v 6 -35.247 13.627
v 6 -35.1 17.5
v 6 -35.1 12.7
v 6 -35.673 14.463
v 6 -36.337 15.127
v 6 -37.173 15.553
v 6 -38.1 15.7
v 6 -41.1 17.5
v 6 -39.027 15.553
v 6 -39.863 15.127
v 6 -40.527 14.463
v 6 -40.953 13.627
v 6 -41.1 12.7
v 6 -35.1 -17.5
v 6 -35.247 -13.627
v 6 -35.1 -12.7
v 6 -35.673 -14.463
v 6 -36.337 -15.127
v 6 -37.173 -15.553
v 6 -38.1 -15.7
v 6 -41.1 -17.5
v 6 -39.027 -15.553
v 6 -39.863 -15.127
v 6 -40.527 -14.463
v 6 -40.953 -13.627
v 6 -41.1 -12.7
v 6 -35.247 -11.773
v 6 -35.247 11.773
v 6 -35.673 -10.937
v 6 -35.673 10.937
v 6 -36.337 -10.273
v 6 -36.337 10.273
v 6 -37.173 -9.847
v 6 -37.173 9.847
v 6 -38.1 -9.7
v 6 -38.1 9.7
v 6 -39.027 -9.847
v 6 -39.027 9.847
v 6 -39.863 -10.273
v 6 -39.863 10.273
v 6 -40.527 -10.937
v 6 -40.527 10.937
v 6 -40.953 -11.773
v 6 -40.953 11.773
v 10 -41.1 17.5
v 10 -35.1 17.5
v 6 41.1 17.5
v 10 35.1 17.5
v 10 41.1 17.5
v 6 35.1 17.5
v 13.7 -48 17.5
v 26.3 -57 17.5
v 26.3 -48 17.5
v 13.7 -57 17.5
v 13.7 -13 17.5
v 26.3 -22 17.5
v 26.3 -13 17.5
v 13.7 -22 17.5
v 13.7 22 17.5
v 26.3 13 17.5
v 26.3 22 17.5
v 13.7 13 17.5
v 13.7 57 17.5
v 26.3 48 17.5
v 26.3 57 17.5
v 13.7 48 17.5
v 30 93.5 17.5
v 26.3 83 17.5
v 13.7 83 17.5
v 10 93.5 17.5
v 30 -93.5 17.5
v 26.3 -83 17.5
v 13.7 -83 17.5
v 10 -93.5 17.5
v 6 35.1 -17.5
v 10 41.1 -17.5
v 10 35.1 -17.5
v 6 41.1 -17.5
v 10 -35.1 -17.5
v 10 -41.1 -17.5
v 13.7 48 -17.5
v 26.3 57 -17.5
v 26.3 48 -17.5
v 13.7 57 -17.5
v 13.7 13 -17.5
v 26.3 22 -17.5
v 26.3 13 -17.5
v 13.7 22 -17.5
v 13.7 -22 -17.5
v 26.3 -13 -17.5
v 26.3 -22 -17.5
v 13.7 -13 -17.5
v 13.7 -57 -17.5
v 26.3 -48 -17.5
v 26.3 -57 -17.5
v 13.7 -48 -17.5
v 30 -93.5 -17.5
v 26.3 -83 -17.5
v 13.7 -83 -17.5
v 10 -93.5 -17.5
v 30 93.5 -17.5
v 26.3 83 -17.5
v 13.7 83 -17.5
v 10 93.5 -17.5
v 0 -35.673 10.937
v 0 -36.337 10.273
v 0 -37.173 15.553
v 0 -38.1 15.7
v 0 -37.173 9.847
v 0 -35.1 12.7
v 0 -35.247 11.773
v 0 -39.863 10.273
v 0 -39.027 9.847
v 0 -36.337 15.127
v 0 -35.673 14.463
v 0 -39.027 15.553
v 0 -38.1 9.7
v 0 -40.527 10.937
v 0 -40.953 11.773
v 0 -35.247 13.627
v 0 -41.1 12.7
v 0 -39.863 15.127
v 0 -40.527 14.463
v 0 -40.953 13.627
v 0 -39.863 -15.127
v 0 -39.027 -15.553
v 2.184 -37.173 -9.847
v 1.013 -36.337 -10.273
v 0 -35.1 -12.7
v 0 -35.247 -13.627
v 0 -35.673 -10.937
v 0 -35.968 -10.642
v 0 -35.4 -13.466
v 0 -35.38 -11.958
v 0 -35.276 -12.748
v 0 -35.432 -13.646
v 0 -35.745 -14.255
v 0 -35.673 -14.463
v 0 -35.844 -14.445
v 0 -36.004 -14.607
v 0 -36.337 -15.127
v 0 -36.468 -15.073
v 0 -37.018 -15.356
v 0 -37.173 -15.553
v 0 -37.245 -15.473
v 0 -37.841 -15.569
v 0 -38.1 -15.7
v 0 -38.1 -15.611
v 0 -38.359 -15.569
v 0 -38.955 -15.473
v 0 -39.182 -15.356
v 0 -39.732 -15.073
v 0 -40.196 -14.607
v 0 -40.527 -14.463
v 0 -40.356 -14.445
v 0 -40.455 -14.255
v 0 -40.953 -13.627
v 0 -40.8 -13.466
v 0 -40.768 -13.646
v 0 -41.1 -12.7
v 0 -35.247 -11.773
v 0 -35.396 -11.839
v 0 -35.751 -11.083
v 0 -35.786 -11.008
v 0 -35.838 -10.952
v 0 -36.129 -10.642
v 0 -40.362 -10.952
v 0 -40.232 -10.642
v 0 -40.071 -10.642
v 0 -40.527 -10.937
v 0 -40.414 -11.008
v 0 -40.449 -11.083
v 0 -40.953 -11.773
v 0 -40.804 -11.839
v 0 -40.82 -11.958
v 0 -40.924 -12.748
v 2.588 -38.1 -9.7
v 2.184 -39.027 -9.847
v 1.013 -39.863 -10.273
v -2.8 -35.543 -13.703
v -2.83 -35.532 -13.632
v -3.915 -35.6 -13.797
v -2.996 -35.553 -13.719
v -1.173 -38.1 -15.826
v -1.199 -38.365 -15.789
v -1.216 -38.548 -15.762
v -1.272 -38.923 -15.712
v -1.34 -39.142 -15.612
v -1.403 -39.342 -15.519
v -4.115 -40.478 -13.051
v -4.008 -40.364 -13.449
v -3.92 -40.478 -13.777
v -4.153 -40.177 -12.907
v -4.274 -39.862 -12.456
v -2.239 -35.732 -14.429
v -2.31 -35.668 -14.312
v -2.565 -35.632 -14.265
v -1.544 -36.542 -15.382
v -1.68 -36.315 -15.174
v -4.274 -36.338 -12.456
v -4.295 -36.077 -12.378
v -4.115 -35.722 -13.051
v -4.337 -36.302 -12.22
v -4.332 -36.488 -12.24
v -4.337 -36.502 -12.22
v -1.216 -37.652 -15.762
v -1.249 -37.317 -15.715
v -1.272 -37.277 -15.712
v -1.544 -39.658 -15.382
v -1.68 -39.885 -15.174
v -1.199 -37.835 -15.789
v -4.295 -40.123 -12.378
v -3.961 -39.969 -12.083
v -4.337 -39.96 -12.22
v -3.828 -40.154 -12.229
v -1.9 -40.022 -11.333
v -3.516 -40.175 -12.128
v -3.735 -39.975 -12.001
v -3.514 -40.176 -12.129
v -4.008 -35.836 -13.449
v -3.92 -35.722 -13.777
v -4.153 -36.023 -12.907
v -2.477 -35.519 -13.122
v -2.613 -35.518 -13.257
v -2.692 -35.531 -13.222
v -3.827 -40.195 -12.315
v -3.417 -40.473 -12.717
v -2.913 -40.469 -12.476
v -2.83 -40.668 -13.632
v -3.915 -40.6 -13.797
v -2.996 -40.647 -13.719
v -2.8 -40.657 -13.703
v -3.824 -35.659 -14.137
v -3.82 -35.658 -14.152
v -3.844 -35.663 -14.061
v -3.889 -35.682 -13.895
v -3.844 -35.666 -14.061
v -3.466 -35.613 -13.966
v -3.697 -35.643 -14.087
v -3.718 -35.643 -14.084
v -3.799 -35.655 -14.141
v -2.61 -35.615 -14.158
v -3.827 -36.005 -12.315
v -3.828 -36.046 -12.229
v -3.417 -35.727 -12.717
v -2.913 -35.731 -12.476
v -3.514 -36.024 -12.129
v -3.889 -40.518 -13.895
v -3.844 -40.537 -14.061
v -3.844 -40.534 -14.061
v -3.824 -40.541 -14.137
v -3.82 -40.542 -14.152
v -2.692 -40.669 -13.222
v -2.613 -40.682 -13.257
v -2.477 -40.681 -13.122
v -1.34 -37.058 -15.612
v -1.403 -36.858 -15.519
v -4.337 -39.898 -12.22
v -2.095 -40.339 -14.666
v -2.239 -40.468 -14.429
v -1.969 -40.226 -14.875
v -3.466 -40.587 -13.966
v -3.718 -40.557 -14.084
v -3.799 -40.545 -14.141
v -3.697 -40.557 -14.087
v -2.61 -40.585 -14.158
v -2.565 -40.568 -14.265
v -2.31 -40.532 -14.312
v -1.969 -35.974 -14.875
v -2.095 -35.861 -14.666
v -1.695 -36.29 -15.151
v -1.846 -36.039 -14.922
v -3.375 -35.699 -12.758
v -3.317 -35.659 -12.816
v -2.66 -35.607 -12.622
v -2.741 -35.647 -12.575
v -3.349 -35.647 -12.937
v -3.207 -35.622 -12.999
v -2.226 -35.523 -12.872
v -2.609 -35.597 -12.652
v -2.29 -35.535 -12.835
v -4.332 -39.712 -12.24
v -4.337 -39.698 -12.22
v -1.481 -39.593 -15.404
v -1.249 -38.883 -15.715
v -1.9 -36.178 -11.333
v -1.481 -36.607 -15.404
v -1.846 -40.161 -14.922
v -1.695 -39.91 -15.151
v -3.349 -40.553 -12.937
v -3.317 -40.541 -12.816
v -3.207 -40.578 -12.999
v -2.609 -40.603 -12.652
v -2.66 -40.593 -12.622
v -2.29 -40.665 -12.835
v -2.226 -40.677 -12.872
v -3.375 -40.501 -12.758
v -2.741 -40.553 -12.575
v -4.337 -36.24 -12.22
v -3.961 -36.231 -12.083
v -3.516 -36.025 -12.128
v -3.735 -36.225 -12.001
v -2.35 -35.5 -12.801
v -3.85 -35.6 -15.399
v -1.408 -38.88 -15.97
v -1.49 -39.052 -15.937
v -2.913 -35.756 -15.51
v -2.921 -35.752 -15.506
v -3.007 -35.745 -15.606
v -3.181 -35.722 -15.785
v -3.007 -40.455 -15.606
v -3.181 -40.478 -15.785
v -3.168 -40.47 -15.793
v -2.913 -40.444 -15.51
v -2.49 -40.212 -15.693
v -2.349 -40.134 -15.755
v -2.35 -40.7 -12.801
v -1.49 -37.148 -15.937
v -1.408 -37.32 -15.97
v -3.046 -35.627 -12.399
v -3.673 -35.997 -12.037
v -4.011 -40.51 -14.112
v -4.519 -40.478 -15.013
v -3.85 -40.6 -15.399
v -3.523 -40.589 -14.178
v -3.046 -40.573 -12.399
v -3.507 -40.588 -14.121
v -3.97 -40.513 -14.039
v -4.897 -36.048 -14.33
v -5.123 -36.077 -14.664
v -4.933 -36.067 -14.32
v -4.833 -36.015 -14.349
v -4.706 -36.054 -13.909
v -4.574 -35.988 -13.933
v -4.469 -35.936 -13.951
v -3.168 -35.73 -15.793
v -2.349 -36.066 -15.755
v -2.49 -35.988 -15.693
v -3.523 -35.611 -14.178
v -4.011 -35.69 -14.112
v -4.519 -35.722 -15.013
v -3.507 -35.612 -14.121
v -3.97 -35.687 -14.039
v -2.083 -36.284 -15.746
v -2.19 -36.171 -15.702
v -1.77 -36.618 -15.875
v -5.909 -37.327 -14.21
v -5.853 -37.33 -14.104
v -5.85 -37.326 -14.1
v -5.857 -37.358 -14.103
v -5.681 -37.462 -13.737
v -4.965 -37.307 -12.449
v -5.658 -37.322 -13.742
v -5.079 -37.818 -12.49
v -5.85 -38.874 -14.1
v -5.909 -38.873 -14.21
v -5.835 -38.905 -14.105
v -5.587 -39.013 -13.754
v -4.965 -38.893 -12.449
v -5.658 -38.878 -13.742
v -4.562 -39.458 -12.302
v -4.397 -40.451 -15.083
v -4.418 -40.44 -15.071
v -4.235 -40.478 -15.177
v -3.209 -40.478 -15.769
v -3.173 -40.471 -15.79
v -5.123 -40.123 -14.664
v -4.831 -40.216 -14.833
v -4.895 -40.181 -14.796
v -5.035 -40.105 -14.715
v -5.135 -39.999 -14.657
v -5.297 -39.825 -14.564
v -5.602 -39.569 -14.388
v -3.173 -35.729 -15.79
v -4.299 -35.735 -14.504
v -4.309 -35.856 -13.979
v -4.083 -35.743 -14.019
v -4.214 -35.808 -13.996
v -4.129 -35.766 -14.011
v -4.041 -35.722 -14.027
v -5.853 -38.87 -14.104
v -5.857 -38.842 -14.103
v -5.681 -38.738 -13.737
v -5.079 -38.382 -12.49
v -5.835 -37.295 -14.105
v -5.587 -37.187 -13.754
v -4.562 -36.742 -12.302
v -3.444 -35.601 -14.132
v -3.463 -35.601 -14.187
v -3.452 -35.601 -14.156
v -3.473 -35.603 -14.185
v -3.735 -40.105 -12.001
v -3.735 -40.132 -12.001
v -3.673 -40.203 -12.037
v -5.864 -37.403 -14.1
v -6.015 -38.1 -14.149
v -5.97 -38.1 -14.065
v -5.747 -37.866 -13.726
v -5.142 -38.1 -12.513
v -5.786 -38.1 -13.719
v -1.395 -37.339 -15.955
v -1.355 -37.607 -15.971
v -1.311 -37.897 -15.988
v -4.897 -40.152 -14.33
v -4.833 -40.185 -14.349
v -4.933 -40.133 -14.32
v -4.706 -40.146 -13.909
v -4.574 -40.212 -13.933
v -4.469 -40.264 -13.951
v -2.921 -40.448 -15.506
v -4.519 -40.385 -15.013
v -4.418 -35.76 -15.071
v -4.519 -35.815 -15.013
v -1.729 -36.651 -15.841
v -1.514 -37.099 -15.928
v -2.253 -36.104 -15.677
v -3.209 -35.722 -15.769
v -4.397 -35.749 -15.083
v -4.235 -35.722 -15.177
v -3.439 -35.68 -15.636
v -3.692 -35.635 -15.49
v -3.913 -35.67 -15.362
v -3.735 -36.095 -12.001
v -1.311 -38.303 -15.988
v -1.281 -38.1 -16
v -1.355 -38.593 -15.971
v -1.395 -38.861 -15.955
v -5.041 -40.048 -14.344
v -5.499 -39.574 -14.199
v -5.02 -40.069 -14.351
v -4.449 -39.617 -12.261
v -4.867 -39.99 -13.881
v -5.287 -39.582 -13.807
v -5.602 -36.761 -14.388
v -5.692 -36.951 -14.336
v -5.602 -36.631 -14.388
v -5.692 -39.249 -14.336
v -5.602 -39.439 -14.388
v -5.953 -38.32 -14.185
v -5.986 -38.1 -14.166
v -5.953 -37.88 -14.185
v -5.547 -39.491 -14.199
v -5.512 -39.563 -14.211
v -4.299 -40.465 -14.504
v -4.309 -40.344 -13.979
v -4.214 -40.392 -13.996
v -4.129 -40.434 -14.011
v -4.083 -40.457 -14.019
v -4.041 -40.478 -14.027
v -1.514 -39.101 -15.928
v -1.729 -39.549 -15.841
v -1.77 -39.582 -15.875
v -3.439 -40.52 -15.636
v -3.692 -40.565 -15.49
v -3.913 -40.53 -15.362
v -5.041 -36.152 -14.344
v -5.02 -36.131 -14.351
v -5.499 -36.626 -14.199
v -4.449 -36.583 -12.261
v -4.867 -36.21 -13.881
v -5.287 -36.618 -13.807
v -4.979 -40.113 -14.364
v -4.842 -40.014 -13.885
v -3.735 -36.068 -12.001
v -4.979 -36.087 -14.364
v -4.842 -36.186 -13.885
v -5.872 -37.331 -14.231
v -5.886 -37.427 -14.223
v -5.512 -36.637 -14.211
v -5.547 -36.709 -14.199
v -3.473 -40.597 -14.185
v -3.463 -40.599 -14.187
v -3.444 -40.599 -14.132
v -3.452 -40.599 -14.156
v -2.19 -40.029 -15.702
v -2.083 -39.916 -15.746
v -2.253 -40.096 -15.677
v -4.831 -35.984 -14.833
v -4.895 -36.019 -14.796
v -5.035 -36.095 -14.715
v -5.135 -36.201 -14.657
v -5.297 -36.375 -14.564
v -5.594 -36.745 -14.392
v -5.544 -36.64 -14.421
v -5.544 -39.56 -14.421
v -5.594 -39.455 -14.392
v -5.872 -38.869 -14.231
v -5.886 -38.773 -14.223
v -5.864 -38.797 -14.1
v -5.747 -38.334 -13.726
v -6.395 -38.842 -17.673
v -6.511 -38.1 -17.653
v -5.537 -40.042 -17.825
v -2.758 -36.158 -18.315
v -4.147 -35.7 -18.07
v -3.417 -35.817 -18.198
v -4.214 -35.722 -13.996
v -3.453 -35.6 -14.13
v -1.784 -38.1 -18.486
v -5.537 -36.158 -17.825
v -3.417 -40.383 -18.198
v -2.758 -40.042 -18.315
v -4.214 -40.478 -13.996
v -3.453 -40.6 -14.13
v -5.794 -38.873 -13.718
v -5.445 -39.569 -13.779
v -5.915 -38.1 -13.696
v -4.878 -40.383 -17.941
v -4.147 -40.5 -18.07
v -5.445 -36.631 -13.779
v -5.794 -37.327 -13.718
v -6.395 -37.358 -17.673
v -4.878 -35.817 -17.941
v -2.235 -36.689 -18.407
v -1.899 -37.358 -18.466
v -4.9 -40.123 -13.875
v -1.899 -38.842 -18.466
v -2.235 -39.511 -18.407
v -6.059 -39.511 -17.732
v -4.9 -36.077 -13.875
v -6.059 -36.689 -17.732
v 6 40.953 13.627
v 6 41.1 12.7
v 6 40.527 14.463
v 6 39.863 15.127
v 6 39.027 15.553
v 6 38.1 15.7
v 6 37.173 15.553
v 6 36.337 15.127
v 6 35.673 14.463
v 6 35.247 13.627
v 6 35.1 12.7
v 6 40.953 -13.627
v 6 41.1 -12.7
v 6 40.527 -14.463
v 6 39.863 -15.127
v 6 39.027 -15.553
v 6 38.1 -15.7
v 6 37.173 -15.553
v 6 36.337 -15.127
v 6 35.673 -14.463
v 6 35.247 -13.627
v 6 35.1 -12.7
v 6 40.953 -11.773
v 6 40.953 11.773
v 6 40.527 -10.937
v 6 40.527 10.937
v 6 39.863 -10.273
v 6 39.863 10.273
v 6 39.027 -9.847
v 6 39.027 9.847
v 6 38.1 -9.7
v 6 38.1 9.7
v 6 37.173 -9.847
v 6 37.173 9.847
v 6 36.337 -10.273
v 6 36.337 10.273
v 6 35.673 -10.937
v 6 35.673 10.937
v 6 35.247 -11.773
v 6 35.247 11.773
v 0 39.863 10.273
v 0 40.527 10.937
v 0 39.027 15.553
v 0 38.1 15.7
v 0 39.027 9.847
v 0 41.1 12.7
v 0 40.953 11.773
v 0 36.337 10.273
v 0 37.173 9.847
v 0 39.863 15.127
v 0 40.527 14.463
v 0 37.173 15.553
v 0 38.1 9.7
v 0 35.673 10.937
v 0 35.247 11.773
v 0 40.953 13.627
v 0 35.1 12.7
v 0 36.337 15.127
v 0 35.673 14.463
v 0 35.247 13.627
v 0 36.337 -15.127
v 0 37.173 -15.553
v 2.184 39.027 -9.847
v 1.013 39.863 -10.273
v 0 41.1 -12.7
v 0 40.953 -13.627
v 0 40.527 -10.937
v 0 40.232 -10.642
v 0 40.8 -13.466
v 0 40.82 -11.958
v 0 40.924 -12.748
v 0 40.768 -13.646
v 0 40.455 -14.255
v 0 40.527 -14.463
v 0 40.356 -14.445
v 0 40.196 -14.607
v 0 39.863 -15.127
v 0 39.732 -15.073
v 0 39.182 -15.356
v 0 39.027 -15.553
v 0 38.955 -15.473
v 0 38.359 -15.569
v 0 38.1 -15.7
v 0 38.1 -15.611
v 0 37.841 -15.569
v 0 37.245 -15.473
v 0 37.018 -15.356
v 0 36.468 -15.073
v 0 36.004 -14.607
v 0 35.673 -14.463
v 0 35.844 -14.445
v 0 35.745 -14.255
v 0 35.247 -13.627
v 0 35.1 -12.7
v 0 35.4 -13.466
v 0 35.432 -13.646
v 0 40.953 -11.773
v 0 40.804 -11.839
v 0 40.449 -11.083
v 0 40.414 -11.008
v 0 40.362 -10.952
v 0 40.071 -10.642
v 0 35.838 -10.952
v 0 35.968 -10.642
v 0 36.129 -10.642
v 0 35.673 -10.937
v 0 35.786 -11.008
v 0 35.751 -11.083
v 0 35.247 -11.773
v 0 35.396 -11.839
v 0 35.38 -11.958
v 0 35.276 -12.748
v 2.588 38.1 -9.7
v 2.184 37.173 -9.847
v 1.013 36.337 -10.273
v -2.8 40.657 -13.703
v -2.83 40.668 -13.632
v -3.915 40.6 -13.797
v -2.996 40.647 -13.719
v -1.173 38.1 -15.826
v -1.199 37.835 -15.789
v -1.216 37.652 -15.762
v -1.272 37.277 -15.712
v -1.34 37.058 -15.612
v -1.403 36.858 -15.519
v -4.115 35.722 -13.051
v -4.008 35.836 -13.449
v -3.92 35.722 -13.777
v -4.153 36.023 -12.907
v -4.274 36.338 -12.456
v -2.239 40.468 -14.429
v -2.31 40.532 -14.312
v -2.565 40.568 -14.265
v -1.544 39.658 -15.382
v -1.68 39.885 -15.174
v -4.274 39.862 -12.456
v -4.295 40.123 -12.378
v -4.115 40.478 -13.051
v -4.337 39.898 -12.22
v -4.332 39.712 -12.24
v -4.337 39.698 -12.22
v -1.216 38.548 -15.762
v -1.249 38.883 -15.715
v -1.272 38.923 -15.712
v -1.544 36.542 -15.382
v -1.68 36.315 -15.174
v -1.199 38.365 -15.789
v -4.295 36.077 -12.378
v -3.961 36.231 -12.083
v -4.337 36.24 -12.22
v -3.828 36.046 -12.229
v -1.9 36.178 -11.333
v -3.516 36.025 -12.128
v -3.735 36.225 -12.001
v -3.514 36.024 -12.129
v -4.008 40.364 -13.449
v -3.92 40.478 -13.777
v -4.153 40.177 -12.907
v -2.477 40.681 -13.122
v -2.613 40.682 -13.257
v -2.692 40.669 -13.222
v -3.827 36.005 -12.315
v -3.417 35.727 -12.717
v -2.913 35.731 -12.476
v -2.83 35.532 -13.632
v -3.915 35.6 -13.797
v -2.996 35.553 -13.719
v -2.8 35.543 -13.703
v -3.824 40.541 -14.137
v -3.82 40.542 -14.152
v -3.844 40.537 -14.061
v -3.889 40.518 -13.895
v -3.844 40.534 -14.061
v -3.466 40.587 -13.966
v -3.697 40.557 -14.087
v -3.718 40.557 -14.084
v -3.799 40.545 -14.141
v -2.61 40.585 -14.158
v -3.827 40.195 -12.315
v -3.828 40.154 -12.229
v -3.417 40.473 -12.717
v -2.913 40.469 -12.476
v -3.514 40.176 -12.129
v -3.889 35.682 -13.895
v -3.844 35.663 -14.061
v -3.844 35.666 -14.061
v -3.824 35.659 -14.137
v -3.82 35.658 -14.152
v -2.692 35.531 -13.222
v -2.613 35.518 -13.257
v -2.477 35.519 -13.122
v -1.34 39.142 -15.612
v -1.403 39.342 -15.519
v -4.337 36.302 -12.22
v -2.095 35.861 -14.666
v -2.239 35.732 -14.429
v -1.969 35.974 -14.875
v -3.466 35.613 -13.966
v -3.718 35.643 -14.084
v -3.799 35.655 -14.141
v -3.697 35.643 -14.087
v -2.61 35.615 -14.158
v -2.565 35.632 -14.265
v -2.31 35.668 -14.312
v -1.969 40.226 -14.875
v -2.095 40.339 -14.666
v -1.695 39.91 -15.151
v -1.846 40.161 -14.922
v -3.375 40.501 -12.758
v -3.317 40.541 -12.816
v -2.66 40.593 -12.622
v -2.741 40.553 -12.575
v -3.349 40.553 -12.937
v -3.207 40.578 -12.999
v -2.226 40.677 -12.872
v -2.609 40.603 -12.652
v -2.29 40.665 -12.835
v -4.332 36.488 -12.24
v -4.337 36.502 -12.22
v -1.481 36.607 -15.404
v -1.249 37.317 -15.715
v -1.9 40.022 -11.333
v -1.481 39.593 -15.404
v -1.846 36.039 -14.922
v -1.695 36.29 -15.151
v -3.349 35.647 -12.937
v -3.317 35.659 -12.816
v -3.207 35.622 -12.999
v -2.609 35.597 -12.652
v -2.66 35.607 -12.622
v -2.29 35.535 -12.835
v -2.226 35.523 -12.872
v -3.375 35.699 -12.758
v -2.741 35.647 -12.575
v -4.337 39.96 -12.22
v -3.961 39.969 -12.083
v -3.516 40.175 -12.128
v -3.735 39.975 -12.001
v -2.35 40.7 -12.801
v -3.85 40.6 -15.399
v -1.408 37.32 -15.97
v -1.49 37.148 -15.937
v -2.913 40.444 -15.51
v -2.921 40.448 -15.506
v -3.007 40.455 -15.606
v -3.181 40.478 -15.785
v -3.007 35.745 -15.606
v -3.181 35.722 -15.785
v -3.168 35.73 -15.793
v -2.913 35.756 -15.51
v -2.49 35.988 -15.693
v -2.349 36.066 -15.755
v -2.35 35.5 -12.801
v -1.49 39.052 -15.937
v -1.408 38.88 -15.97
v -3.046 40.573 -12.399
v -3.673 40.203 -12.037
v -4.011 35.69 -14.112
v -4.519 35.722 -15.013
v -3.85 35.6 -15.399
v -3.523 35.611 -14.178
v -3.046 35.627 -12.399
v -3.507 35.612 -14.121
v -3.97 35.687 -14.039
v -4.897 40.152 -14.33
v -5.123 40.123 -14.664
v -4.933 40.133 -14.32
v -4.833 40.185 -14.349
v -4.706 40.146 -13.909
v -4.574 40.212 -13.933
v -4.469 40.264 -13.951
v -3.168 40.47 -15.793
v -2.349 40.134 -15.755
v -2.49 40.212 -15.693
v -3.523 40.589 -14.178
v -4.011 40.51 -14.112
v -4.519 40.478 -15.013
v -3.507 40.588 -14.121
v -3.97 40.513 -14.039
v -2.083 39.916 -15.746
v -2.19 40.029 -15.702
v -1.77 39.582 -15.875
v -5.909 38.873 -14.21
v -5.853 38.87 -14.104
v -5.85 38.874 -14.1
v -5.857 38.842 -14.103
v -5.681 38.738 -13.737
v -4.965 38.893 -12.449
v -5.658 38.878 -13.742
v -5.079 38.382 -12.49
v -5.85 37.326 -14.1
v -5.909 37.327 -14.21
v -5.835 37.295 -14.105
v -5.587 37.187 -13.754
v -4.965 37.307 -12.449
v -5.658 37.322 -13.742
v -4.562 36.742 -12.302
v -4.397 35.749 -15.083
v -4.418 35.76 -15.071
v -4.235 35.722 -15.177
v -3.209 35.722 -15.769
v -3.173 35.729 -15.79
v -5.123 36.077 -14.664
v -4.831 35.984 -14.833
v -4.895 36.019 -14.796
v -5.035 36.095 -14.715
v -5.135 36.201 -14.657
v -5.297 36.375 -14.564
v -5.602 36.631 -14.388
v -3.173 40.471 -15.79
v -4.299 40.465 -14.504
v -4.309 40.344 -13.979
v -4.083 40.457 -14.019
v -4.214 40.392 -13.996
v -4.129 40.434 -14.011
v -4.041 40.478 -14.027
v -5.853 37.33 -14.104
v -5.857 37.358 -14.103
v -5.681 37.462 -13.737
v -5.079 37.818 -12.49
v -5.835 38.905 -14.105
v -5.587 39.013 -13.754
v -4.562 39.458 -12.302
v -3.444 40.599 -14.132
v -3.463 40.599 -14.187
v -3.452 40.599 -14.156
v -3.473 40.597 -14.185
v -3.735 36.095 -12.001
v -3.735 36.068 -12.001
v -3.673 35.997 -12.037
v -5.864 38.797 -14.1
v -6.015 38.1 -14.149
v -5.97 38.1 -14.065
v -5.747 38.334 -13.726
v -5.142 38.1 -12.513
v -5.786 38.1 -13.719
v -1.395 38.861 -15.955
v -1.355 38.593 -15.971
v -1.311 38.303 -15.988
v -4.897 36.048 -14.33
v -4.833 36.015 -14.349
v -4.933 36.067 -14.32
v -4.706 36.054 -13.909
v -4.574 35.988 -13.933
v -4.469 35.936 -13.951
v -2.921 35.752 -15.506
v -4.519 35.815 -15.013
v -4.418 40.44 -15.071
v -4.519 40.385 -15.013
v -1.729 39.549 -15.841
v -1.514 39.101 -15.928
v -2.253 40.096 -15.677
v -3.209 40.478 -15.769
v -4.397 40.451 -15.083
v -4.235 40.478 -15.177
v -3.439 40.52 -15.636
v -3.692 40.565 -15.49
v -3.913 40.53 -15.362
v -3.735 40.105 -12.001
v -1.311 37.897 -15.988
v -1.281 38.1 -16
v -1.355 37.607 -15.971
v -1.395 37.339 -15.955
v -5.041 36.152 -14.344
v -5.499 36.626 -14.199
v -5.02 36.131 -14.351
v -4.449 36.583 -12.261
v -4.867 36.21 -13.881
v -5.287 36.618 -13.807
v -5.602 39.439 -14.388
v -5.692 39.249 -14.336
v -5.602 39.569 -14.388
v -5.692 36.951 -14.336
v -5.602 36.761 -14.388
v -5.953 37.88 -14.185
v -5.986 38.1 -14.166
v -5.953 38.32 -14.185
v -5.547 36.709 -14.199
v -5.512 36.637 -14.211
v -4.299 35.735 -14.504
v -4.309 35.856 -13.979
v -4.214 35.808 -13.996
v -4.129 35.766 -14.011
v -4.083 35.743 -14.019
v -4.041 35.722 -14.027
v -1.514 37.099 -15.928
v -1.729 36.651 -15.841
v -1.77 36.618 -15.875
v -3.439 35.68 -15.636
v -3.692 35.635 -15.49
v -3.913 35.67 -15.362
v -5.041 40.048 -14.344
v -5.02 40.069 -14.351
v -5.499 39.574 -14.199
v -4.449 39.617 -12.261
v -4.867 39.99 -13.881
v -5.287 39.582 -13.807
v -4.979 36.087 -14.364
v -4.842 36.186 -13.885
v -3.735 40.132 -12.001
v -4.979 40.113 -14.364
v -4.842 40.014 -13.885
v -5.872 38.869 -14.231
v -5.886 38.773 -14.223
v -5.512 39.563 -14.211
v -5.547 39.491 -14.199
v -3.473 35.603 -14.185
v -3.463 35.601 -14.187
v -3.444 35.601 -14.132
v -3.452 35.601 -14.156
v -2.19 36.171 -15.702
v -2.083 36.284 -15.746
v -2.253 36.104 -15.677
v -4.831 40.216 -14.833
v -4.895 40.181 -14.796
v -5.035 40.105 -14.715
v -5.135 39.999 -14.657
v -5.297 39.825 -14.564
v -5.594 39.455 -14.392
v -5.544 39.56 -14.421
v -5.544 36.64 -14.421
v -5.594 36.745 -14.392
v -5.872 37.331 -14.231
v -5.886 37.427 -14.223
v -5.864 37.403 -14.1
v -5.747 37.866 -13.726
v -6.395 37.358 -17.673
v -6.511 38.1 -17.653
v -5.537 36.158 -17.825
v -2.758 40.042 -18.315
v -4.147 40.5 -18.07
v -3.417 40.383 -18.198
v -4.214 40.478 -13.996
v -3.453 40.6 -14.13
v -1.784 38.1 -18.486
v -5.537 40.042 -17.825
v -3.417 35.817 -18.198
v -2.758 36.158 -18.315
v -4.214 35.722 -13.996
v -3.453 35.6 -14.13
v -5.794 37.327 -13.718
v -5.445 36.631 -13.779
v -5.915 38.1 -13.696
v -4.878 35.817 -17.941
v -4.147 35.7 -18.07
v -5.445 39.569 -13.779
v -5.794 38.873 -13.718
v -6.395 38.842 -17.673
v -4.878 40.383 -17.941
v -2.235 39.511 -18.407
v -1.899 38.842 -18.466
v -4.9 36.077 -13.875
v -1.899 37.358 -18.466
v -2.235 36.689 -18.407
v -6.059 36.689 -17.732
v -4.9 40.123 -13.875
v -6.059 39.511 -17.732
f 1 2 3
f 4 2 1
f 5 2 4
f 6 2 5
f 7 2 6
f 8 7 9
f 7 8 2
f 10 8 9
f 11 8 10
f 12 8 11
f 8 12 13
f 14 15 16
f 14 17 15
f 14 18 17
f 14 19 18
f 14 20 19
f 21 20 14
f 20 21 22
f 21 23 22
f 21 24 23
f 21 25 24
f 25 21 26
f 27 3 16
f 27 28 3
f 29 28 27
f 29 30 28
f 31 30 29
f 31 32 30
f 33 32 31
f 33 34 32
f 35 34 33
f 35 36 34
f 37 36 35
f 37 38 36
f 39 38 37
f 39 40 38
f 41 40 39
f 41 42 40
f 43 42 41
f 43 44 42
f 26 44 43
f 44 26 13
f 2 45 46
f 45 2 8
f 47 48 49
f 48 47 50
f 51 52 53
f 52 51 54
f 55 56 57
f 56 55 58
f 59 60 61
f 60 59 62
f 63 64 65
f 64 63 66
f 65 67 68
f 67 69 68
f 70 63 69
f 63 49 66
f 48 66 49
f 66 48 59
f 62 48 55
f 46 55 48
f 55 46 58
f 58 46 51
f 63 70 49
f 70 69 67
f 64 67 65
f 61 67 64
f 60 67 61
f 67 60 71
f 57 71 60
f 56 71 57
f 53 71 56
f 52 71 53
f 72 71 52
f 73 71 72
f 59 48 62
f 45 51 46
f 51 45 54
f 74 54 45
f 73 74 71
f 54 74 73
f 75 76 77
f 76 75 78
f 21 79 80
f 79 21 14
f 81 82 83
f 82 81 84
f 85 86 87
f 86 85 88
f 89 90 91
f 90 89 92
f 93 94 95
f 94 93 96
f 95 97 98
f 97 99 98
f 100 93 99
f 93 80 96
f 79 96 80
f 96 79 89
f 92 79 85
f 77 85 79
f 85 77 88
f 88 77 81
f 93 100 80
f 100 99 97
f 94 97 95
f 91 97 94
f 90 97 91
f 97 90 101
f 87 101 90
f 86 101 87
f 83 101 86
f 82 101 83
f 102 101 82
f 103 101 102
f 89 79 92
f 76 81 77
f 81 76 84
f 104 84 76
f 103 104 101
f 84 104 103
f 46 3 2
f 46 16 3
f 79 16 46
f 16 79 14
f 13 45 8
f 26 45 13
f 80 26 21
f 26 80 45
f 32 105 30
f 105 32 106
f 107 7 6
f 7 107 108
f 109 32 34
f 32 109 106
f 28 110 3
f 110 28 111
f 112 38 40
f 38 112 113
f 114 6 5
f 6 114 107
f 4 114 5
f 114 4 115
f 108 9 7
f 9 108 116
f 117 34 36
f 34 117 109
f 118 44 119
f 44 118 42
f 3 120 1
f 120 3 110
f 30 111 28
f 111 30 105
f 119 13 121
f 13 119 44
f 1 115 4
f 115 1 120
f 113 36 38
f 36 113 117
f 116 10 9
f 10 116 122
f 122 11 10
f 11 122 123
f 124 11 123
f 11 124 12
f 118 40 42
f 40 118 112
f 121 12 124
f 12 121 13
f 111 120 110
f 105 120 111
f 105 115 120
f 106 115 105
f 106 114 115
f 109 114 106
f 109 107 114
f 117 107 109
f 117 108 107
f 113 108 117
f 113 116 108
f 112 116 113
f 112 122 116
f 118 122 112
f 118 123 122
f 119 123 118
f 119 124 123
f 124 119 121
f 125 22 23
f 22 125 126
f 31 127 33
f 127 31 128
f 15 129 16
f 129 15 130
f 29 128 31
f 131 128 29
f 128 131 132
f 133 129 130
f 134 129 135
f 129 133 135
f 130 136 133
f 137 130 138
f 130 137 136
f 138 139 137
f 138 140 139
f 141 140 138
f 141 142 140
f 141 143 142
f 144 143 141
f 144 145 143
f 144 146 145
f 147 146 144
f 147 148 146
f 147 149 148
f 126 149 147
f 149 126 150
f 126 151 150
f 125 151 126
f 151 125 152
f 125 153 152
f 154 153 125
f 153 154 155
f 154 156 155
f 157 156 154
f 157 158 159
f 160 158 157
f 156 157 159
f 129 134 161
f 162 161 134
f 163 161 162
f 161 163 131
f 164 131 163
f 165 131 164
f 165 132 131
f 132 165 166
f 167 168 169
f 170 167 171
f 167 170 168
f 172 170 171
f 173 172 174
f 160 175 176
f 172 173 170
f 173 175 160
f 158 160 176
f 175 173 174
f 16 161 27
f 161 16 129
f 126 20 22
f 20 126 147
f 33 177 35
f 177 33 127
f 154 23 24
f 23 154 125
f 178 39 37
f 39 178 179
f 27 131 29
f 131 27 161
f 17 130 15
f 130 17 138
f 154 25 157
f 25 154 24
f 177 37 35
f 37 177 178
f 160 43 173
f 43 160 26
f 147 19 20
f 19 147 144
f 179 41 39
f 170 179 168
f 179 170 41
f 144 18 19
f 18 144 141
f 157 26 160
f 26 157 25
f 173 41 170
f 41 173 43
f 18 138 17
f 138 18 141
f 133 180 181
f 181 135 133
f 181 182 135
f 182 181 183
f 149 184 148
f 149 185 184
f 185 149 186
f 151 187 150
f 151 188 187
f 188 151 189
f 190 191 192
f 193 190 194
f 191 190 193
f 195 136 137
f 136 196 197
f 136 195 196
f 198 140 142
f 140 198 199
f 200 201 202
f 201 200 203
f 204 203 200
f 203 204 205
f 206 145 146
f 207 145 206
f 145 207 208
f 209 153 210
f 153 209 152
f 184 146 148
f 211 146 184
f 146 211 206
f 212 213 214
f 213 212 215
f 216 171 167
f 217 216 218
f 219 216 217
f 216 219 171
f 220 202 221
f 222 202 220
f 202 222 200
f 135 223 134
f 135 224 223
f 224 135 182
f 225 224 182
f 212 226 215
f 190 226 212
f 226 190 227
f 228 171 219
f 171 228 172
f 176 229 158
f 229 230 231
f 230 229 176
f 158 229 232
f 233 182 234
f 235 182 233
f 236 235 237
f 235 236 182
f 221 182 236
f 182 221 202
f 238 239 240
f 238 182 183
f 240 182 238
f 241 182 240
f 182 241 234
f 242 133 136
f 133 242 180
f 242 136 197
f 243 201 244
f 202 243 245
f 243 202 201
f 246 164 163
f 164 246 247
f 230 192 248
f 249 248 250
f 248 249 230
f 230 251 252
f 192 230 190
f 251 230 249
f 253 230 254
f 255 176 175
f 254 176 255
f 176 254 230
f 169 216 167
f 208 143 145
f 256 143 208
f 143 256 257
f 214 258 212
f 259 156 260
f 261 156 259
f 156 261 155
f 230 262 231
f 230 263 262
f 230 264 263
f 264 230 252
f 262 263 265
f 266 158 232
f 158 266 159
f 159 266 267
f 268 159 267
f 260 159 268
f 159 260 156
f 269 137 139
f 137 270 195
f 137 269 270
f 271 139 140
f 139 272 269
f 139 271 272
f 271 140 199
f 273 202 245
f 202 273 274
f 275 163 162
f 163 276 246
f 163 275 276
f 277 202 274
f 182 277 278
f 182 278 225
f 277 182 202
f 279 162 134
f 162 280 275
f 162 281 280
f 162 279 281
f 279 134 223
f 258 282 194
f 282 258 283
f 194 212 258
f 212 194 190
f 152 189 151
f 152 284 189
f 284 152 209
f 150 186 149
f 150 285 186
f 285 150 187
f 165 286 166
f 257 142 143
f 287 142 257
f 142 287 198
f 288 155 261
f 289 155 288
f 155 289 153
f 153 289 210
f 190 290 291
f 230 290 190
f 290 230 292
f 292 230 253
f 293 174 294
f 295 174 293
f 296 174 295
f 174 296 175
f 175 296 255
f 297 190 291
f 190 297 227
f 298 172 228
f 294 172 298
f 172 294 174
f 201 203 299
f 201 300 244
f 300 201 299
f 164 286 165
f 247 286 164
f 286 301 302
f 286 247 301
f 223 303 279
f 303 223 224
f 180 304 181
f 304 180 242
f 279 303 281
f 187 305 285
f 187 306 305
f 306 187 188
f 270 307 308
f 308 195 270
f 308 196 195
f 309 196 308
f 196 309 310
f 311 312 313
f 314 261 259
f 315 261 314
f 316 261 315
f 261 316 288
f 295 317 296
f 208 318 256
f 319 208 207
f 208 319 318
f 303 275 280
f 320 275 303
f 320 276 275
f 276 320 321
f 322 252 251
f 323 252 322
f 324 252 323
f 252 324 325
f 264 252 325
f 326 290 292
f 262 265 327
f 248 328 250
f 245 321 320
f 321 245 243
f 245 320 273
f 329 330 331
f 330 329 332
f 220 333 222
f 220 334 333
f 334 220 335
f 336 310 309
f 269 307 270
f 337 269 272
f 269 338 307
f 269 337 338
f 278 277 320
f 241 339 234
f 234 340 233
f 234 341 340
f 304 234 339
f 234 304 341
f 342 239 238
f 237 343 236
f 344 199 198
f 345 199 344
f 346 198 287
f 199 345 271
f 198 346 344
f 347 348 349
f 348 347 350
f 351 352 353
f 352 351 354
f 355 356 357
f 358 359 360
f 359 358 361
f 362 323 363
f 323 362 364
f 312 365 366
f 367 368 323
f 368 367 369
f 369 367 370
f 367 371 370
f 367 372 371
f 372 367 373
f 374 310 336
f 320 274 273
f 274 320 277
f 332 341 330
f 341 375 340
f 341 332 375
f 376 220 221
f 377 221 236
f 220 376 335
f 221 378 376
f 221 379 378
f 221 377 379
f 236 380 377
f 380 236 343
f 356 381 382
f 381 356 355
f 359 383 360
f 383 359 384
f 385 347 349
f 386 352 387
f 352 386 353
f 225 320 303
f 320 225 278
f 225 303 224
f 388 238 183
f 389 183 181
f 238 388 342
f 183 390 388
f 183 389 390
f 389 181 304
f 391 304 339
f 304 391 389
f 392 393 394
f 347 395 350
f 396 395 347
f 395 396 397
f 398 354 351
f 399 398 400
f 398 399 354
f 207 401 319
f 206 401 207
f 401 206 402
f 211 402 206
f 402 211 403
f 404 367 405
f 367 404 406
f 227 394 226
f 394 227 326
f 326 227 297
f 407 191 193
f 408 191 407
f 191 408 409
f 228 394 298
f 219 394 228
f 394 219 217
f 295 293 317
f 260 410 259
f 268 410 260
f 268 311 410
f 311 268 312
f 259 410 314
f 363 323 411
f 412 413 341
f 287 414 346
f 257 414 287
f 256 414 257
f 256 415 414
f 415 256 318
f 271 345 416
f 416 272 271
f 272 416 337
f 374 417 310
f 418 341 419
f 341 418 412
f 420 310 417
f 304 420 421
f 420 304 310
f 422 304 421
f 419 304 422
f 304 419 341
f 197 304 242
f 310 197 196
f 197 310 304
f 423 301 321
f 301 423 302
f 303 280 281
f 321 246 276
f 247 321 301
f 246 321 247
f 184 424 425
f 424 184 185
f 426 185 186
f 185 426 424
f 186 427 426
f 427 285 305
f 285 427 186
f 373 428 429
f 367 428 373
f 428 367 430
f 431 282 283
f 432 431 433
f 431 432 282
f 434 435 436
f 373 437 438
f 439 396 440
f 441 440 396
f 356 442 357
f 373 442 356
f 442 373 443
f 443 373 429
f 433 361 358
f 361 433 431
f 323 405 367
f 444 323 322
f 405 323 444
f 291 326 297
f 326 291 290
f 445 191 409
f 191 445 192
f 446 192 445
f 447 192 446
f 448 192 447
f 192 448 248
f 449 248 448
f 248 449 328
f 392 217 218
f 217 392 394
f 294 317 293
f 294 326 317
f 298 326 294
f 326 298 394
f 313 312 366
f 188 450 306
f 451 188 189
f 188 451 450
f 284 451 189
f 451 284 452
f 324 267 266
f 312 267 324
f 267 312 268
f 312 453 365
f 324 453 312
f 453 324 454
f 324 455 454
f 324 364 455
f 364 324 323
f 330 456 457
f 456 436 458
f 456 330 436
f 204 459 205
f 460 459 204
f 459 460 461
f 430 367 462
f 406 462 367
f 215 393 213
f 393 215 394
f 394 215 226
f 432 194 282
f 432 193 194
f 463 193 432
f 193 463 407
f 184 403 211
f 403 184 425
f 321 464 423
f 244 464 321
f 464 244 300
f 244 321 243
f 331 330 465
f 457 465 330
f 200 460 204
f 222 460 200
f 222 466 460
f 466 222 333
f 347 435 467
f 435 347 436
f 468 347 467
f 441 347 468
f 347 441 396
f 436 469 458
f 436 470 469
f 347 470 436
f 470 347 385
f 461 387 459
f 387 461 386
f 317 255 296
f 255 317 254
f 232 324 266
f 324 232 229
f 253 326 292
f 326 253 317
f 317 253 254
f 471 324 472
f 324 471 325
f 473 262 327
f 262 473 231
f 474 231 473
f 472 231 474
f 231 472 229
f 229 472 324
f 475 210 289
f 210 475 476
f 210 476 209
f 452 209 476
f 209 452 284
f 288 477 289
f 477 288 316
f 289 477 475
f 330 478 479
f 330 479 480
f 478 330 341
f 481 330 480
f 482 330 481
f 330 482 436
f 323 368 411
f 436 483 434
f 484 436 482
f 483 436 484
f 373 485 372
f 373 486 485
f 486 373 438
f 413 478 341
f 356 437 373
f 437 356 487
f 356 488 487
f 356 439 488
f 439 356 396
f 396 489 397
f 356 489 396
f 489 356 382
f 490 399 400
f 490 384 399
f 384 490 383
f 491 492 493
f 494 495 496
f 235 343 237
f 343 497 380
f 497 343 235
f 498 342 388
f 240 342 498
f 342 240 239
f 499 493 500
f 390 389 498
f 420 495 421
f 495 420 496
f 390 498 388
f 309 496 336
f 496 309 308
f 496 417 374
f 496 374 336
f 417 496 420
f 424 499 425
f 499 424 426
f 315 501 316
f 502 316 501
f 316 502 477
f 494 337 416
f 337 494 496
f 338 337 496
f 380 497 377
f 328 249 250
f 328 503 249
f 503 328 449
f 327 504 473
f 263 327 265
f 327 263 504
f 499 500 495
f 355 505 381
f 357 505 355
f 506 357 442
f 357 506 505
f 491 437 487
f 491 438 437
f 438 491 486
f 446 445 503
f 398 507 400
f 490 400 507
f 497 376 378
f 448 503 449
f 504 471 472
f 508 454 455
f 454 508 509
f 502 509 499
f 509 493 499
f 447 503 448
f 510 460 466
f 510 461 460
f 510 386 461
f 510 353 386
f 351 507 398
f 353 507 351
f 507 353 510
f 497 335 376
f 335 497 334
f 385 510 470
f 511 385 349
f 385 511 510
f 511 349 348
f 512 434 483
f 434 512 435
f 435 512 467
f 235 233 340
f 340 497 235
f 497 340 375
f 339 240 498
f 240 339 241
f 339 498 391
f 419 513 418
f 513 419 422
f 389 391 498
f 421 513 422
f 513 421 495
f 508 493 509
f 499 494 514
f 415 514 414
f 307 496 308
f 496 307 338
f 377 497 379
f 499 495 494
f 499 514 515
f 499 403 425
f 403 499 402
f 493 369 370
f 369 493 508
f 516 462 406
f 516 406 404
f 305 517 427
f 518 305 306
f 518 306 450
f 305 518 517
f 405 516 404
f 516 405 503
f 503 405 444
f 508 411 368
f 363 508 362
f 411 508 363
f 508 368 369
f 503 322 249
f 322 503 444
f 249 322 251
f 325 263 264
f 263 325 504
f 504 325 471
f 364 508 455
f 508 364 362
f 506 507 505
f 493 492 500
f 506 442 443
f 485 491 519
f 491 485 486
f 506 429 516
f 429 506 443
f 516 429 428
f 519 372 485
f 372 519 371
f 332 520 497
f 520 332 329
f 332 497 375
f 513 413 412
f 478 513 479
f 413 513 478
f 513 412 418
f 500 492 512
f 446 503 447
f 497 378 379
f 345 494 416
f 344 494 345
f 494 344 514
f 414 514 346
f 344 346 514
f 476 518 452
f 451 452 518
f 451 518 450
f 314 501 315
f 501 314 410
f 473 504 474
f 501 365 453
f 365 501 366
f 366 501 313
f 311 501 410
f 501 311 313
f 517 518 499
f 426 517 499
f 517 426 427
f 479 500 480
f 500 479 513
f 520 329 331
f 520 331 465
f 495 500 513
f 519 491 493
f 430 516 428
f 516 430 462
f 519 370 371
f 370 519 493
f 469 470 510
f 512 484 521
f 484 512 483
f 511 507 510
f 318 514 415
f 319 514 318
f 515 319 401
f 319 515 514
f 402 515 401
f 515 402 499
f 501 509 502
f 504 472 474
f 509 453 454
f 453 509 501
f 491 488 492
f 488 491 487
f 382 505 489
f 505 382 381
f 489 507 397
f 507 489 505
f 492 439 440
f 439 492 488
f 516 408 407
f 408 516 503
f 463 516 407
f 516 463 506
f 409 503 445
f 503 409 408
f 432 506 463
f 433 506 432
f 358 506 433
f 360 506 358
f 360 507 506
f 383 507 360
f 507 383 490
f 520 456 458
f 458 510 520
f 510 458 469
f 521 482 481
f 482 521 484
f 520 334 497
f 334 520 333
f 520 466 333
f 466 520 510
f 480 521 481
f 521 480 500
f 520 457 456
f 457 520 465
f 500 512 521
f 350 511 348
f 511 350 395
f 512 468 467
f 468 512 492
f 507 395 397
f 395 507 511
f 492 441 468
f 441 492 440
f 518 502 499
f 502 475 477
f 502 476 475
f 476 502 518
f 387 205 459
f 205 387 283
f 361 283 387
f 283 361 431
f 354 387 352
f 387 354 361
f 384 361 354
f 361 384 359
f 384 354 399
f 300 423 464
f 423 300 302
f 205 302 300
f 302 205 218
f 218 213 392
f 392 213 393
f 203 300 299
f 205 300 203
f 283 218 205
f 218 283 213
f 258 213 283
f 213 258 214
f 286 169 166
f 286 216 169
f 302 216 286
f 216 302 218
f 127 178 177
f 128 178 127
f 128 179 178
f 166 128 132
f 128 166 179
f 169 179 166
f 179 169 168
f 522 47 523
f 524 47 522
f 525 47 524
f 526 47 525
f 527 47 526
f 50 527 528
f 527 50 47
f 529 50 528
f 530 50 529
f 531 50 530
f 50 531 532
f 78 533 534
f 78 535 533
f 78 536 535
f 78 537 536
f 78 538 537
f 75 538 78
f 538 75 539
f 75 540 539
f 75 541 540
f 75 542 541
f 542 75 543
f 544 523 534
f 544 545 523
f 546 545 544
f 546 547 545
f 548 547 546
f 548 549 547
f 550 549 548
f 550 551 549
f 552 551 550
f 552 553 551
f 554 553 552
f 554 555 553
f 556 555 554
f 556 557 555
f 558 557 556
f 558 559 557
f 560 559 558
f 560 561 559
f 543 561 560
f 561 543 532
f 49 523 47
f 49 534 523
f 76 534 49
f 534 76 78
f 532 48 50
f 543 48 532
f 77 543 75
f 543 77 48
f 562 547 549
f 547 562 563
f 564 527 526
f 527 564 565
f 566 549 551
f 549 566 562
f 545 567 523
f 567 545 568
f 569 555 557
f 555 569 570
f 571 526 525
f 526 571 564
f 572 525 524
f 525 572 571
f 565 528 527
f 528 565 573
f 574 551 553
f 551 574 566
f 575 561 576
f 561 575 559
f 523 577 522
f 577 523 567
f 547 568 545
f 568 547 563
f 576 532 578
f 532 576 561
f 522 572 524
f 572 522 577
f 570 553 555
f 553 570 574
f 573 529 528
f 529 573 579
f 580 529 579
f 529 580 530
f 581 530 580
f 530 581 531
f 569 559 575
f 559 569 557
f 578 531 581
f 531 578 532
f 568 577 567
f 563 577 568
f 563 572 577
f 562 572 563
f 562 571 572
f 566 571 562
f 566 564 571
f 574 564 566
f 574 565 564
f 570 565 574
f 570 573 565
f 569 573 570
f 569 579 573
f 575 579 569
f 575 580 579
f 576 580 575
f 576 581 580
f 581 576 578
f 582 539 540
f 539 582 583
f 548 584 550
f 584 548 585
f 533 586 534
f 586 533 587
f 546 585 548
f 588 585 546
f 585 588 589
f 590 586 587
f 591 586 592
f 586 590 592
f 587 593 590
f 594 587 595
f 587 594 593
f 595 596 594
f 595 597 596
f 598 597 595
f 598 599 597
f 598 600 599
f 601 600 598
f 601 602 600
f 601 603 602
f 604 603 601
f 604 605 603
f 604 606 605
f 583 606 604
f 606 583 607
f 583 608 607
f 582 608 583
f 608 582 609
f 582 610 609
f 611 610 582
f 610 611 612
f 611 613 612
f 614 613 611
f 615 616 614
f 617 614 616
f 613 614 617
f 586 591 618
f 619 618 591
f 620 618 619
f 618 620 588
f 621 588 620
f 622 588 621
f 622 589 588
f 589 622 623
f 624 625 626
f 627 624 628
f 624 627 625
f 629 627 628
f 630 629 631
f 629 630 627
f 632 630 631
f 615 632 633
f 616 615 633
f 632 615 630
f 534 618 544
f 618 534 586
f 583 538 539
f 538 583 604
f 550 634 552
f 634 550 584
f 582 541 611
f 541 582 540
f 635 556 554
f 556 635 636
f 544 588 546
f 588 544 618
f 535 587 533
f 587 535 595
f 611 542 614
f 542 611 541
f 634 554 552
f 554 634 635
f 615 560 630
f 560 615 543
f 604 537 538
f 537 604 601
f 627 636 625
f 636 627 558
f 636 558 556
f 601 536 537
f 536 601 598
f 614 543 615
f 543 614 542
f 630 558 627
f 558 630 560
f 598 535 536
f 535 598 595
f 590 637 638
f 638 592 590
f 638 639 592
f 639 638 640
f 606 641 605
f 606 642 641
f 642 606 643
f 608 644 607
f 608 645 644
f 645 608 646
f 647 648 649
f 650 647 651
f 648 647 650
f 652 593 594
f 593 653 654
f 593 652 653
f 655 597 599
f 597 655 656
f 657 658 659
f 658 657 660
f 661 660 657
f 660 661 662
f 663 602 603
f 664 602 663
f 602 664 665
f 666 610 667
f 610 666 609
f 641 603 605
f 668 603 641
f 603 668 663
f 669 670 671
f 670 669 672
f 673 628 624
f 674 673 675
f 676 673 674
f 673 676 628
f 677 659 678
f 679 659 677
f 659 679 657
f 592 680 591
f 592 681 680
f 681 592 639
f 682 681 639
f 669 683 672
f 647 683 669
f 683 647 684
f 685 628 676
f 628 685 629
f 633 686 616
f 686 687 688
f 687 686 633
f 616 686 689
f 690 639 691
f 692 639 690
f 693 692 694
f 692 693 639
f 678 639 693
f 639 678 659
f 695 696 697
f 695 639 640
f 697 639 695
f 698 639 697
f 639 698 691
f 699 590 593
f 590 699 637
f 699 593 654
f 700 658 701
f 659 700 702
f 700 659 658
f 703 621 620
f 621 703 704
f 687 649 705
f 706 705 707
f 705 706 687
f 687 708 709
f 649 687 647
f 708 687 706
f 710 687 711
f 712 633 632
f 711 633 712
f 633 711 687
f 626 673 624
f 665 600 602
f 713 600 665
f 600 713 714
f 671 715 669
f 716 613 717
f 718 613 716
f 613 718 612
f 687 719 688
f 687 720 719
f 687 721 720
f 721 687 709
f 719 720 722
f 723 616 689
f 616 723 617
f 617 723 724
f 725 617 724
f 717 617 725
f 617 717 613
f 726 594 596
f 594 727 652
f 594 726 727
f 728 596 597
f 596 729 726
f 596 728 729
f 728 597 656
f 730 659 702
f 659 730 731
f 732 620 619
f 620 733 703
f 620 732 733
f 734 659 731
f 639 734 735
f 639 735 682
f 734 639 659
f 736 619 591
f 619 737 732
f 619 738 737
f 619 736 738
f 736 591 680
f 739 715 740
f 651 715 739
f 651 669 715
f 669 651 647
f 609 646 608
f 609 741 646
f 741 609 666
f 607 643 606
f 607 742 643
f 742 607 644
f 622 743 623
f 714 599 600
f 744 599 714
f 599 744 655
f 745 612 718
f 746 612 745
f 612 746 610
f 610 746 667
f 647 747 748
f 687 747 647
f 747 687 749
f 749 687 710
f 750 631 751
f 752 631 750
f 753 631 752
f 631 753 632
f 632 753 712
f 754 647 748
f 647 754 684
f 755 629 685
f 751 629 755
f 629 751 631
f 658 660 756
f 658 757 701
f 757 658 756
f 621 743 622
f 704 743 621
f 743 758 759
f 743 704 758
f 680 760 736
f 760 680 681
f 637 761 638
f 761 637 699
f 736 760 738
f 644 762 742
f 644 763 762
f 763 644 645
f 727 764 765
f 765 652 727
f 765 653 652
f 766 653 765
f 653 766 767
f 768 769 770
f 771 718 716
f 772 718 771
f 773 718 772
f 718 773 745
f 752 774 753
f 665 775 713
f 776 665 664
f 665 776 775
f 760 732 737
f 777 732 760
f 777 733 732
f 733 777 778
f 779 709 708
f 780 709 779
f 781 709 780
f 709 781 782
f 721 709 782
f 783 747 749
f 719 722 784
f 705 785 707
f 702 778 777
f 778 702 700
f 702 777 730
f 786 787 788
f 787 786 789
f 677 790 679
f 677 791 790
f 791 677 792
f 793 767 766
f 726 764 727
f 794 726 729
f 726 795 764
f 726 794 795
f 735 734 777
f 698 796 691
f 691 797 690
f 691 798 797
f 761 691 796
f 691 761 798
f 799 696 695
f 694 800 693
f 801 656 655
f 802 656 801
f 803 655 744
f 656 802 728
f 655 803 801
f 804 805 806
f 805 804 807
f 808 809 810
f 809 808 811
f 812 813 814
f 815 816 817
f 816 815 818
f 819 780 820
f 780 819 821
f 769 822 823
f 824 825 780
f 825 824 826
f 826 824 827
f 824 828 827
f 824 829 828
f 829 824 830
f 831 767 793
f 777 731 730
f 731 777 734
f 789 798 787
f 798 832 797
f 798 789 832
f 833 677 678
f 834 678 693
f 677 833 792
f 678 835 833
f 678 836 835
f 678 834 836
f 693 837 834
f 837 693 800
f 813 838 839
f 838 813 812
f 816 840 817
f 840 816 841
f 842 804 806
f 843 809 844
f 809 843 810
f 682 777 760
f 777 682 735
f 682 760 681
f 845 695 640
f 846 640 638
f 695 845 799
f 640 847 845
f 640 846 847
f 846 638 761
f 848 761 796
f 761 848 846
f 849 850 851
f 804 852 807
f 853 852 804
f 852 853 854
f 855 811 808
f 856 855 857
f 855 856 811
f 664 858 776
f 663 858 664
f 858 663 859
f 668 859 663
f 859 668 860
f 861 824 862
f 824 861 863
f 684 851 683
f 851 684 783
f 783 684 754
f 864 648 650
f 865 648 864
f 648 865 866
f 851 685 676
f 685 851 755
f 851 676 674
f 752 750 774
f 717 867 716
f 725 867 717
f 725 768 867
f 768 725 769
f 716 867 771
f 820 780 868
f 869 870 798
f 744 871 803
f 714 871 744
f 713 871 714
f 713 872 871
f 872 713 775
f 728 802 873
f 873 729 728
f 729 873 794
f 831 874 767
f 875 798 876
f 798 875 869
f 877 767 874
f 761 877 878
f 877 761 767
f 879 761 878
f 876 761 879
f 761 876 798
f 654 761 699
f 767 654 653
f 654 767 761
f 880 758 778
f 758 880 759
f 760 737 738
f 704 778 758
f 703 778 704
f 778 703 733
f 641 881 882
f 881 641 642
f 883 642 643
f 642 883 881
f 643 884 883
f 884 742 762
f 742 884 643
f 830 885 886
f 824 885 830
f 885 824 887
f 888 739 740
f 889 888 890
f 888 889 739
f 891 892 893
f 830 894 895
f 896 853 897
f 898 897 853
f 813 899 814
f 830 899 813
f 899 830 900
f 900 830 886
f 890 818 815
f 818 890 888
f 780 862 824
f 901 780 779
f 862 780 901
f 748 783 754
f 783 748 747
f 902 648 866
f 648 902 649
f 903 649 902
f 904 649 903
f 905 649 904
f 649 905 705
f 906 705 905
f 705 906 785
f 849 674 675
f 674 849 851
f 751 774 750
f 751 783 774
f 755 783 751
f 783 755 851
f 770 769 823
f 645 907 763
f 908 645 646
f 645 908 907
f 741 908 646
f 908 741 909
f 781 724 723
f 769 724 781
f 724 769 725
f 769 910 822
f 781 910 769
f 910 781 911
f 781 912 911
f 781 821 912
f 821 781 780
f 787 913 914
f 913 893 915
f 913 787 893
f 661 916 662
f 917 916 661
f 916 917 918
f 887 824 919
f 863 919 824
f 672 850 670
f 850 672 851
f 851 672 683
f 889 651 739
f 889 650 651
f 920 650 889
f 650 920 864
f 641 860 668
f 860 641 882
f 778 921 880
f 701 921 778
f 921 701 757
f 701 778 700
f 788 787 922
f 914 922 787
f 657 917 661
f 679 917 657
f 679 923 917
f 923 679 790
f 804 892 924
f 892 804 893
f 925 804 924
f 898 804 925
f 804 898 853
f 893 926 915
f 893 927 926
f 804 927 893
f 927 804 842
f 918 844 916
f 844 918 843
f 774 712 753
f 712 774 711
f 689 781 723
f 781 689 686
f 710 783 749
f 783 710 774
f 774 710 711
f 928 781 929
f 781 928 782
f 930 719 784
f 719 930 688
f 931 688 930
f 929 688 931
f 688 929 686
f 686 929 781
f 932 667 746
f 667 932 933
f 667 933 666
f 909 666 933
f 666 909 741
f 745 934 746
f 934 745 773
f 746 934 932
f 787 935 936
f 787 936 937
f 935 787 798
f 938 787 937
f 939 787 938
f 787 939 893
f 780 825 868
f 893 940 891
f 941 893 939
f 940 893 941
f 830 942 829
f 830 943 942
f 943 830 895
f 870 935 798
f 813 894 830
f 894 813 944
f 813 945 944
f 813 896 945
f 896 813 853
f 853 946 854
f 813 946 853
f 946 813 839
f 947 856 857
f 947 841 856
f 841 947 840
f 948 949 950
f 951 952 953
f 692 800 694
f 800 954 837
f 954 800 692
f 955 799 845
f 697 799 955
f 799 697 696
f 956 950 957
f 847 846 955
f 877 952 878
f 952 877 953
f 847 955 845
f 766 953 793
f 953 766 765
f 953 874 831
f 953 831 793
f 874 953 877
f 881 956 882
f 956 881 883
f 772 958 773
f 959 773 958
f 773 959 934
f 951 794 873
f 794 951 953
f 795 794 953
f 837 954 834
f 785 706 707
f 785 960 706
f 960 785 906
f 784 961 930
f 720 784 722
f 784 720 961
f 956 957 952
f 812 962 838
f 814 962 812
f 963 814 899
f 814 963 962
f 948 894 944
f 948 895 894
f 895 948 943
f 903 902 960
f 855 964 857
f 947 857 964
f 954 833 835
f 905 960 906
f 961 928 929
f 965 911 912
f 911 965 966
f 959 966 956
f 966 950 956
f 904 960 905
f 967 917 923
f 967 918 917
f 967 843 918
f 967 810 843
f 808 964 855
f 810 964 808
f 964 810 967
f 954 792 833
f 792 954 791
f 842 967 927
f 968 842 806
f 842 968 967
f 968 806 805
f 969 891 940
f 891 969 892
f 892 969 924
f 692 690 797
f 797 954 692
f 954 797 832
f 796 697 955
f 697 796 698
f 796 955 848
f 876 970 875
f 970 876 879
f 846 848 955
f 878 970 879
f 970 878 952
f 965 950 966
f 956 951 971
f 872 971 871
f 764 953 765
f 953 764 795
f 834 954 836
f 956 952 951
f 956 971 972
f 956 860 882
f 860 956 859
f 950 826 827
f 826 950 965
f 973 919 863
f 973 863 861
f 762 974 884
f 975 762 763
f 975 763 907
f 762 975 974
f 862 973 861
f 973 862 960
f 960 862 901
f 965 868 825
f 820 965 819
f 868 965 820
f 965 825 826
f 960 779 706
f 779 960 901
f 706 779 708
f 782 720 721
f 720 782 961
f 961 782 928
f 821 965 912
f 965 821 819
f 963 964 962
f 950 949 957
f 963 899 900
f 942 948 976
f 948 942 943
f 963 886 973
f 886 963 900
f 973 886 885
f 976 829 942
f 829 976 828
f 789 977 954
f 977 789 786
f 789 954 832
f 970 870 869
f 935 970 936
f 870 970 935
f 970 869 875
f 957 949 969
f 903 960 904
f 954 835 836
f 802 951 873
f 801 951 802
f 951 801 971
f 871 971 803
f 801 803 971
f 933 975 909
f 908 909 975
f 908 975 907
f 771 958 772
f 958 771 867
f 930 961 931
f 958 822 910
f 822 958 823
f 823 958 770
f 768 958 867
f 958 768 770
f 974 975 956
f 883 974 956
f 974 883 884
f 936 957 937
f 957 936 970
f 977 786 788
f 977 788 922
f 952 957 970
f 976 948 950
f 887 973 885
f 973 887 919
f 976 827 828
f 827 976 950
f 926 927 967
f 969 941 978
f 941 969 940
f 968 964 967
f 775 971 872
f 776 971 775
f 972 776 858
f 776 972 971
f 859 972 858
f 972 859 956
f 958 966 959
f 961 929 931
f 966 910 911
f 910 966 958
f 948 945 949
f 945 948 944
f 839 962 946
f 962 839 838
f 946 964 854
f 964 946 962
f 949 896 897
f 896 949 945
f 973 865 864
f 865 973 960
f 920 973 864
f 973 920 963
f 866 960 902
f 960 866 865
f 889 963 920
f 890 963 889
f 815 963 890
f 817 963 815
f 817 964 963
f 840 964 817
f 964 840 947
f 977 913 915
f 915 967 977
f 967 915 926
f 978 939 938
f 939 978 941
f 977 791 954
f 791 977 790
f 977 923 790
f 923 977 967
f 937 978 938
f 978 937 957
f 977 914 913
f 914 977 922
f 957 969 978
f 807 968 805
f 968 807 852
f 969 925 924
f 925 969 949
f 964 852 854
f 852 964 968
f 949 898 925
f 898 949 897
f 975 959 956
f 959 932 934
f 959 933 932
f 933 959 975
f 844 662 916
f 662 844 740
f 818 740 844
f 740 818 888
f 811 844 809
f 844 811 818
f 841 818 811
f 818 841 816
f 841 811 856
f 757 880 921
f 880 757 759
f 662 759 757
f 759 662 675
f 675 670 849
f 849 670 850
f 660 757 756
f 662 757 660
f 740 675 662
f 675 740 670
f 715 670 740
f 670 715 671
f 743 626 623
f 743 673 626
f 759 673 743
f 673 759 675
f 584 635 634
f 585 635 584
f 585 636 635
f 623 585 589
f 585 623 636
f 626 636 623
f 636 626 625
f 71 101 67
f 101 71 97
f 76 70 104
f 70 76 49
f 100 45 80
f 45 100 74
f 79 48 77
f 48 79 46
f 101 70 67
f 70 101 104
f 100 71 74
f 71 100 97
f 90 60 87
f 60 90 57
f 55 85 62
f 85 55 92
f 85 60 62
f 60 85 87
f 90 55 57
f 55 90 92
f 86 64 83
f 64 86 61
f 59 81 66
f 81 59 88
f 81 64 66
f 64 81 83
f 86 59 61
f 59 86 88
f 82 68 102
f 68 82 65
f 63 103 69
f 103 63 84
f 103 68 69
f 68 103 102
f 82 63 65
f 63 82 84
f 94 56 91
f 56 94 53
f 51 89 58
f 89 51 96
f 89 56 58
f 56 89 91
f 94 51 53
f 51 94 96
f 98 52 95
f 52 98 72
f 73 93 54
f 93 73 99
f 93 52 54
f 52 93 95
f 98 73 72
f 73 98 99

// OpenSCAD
$fn=20;
rad=5.6;

//%import("/home/paul/Downloads/10mmHook.stl");
module peghookbase(thickness) {
    difference(){
        union(){

//cylinder behind hook
translate([-6 - thickness/2,0,0])rotate([90,0,0])cube([thickness,6,35], center=true);
translate([-4,-12.7,0])rotate([0,90,0])cylinder(r=3,h=8, center=true);
translate([-4,12.7,0])rotate([0,90,0])cylinder(r=3,h=8, center=true);
translate([1.5,13.15,0])rotate([0,90,15])cylinder(r1=2.9,r2=2.5,h=5, center=true);
translate([3.1,14.1,0])rotate([0,90,60])cylinder(r1=2.6,r2=2.5,h=3,center=true);
//hooks
   translate([3.8,16.1,0])rotate([0,90,80])cylinder(r1=2.5,r2=2.4,h=4,center=true);}
   rotate([0,0,20])translate([6,4,0])cube(12, center=true);}
}



translate([0,-38.1,0])rotate([90, 180,0])peghookbase(7.5);
translate([0,38.1,0])rotate([90, 180,0])peghookbase(7.5);
//base
translate([20,0,0])difference(){
    cube([20,187,35], center=true);
    
//slots
   
    translate([0,0,0]) cube([12.6,26,36], center = true);
    translate([0,35,0]) cube([12.6,26,36], center = true);
    translate([0,70,0]) cube([12.6,26,36], center = true);
    translate([0,-35,0]) cube([12.6,26,36], center = true);
    translate([0,-70,0]) cube([12.6,26,36], center = true);
//holes
    /*translate([0,0,0])cylinder(r=rad, h=36, center=true);
    translate([0,15,0])cylinder(r=rad, h=36, center=true);
    translate([0,30,0])cylinder(r=rad, h=36, center=true);
    translate([0,-30,0])cylinder(r=rad, h=36, center=true);
    translate([0,-15,0])cylinder(r=rad, h=36, center=true);
    translate([0,45,0])cylinder(r=rad, h=36, center=true);
    translate([0,-45,0])cylinder(r=rad, h=36, center=true);
    translate([0,60,0])cylinder(r=rad, h=36, center=true);
    translate([0,-60,0])cylinder(r=rad, h=36, center=true);
    translate([0,75,0])cylinder(r=rad, h=36, center=true);
    translate([0,-75,0])cylinder(r=rad, h=36, center=true);
    */
};
